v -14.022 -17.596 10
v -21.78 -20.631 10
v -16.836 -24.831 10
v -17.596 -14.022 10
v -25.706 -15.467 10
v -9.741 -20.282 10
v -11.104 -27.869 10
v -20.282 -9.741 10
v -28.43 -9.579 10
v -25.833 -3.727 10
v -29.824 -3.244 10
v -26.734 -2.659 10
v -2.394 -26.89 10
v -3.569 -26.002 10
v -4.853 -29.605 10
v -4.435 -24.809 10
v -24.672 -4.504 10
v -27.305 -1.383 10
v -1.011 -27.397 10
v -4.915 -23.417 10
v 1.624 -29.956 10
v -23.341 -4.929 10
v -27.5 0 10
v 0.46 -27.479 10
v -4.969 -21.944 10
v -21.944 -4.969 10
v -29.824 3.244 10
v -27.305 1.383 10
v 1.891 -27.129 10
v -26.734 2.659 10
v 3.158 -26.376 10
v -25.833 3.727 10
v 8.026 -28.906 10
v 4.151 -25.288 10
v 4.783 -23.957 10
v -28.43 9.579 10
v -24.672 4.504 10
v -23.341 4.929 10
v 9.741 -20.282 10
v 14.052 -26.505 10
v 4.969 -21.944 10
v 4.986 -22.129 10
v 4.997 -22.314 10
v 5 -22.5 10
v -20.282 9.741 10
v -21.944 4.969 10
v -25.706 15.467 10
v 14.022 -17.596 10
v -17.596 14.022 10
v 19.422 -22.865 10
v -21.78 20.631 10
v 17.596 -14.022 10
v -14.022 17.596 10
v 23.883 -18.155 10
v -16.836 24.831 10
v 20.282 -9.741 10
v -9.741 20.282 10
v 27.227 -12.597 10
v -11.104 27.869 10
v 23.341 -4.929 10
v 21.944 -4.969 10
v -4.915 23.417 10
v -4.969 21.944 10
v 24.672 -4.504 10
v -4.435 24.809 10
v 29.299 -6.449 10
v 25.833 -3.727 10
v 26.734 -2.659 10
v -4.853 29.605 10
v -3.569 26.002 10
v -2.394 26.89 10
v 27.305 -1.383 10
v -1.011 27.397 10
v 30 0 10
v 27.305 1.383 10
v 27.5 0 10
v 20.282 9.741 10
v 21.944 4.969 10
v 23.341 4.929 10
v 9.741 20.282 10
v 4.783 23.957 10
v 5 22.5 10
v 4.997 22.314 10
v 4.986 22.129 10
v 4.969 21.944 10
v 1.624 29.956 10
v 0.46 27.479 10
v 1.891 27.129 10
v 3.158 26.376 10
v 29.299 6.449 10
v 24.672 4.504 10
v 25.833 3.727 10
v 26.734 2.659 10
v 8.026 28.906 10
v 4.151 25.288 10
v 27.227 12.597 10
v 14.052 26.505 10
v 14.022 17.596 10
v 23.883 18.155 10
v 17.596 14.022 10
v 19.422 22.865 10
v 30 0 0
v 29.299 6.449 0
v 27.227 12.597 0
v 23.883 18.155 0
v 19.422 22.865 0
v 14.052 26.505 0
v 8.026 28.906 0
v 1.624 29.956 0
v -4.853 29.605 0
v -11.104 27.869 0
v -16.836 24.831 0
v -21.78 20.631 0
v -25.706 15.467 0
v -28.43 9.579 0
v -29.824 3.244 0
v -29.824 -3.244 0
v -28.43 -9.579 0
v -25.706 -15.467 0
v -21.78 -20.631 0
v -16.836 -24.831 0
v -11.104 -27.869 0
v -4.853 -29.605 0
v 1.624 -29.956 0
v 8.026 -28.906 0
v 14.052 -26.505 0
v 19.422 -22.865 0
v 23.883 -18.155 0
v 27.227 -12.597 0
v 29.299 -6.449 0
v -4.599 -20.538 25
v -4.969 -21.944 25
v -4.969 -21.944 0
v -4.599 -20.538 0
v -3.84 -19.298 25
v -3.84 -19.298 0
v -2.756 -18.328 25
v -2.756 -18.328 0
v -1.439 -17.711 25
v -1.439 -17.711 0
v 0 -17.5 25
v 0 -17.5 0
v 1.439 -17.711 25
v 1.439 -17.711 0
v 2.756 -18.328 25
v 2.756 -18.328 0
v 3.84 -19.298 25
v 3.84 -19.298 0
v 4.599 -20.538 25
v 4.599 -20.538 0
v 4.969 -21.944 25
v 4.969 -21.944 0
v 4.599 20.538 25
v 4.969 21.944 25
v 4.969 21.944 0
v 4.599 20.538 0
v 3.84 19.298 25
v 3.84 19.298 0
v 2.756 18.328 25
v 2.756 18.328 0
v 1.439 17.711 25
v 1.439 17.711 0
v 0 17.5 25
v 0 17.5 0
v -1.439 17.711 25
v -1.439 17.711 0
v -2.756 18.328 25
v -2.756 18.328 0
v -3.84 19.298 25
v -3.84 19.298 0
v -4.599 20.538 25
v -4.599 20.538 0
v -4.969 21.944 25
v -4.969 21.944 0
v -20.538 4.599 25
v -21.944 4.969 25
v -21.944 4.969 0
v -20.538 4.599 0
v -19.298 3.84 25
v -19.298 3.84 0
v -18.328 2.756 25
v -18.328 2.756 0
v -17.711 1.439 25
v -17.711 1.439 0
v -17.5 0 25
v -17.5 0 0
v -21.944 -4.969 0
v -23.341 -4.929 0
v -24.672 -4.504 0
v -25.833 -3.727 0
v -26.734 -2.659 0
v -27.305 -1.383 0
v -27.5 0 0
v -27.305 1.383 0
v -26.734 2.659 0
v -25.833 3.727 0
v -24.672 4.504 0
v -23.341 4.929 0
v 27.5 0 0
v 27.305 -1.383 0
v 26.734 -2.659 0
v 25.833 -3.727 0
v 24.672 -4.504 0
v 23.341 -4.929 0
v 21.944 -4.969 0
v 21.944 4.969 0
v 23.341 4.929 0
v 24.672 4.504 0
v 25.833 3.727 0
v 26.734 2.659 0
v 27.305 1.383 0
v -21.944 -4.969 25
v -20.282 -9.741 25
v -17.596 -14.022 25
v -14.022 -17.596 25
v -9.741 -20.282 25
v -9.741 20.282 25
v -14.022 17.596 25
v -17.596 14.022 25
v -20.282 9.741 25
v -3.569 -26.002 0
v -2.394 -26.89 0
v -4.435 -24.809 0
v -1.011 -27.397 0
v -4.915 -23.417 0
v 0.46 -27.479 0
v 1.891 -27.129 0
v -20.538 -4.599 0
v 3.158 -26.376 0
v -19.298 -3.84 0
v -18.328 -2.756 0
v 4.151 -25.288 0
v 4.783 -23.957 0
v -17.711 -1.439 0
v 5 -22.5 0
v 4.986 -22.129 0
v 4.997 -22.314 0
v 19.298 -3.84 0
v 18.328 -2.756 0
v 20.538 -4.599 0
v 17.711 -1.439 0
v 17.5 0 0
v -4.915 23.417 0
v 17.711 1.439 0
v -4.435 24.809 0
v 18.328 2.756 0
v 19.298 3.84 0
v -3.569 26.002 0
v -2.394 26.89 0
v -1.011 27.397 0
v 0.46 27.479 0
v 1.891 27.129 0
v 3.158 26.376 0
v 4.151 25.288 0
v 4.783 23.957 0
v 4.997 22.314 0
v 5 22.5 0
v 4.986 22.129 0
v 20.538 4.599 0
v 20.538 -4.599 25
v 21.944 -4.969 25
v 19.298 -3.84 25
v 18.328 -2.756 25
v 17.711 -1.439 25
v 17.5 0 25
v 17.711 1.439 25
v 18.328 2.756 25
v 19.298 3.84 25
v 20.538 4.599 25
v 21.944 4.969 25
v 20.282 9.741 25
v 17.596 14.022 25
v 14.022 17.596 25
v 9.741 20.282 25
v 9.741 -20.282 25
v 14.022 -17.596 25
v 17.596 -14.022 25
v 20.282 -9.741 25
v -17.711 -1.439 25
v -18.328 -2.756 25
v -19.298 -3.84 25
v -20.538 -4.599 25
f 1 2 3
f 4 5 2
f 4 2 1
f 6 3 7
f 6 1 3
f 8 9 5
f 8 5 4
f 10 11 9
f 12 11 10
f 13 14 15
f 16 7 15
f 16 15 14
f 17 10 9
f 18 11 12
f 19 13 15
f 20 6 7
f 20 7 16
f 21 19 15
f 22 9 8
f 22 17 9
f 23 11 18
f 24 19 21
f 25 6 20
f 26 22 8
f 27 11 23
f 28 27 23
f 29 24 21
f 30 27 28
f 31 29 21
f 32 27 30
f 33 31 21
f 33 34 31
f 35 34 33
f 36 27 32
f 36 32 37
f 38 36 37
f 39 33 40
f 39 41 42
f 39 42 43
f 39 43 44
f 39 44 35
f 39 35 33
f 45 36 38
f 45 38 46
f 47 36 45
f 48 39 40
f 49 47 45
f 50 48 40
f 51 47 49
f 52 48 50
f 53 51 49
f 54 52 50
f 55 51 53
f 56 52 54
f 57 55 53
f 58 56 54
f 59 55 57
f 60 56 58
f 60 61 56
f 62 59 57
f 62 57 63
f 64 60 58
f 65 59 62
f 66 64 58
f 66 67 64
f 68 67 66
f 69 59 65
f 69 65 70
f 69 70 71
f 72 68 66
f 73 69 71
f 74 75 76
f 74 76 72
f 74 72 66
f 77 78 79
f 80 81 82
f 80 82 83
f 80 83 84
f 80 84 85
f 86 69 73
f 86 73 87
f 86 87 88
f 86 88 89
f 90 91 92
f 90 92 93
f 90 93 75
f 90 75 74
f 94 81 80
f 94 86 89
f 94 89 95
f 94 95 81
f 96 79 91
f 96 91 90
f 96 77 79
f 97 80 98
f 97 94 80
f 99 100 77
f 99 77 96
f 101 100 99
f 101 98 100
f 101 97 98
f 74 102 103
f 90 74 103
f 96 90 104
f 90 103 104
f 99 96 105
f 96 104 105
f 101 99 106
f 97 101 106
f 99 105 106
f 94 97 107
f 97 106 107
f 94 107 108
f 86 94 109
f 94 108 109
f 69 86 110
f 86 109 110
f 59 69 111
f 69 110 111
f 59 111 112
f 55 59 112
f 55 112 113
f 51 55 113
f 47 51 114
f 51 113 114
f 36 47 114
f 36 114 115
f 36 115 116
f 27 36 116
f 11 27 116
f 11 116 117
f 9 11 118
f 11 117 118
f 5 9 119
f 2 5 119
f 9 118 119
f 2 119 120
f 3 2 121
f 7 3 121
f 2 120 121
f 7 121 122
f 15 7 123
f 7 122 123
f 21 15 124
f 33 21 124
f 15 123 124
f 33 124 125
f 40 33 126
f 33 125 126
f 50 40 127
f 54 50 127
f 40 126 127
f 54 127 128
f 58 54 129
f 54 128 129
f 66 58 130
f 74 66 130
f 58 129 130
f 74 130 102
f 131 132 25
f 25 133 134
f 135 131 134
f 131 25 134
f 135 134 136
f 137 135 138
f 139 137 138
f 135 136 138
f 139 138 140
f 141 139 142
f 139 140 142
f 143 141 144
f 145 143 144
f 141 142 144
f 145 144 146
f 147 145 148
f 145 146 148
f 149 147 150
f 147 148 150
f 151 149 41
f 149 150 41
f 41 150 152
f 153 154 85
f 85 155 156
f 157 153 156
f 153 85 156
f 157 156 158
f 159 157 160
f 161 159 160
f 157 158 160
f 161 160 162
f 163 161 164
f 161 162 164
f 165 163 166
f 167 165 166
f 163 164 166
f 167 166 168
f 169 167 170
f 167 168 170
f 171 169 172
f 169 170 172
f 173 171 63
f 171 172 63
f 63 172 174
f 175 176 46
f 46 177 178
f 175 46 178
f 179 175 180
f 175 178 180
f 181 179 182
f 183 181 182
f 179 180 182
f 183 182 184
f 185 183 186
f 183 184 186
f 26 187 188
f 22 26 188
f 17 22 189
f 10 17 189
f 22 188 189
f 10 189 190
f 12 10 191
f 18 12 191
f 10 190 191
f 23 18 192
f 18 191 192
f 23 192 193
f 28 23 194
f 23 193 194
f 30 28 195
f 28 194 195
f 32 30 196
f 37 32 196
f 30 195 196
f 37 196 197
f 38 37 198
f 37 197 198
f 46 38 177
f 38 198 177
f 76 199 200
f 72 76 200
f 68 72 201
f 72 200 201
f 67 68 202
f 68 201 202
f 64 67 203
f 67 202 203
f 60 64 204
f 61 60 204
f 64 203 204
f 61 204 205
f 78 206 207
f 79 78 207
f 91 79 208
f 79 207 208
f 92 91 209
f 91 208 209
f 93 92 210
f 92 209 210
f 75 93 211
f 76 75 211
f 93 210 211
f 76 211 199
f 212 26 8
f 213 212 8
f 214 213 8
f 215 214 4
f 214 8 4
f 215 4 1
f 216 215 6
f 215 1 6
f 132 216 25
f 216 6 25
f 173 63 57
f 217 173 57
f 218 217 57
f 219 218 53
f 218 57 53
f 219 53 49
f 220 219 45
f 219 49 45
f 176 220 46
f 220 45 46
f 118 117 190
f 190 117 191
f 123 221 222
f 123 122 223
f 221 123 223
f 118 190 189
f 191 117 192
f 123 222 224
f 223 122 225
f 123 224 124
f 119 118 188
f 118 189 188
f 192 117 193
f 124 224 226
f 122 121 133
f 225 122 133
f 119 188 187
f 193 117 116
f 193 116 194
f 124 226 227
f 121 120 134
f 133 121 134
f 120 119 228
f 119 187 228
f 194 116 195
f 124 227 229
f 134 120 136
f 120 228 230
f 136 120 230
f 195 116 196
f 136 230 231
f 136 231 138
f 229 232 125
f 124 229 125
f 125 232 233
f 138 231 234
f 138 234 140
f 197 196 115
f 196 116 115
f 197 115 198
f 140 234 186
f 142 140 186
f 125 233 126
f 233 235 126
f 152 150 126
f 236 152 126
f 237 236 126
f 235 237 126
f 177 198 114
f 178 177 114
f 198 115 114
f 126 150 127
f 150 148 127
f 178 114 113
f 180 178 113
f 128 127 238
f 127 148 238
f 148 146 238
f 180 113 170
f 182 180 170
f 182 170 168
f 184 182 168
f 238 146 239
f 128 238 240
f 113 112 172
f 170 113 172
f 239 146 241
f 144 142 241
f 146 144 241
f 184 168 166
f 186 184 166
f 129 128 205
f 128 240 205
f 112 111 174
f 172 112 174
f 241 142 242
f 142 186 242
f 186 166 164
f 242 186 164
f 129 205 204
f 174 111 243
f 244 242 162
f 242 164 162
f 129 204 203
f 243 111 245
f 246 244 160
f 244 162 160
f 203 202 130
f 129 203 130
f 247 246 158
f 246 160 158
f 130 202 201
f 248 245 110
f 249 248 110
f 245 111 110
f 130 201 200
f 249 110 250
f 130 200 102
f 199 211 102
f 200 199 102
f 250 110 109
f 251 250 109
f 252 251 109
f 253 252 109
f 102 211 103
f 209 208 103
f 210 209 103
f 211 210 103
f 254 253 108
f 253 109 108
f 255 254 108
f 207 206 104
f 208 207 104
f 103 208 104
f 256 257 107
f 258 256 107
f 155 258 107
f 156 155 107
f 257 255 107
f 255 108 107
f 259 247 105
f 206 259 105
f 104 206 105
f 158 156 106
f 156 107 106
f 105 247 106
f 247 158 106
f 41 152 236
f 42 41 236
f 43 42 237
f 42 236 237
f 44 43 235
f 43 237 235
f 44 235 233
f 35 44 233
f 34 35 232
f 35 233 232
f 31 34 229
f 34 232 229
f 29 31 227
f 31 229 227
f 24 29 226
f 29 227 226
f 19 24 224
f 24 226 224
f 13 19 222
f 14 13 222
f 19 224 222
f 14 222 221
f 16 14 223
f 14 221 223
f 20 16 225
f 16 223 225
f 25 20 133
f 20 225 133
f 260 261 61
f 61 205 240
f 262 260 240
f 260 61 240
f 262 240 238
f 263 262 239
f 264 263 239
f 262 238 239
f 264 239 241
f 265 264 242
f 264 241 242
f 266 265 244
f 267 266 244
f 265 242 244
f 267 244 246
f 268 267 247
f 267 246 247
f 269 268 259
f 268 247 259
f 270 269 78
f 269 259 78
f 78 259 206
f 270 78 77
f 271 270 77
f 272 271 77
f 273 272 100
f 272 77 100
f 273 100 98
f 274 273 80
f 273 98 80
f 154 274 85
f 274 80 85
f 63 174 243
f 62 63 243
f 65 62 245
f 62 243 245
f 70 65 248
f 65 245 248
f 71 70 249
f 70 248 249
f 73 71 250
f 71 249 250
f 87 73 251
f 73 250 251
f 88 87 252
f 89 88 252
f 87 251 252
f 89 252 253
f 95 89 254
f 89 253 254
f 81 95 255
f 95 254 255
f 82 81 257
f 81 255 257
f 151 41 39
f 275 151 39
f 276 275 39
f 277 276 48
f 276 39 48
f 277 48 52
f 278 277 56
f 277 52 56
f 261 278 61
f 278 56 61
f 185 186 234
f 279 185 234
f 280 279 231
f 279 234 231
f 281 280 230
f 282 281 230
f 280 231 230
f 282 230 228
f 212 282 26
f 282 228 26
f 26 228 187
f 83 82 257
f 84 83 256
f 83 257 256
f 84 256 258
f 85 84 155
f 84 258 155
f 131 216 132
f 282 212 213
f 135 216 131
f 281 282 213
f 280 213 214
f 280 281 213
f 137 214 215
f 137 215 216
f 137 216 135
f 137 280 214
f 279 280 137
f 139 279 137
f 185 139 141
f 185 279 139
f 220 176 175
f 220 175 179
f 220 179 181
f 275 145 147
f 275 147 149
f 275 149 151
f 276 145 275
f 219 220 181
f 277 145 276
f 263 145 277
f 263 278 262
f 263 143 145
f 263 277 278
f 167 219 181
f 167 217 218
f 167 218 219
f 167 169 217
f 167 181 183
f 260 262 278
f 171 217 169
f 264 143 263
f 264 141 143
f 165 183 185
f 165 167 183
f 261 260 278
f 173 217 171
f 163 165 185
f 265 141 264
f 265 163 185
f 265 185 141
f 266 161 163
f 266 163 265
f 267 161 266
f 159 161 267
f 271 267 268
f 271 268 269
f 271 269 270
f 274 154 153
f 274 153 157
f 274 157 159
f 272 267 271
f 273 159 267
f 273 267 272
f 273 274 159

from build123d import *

# Parameters (mm, degrees)
F1_DEPTH = 25
F0_R     = 30
F2_DEPTH = 10


with BuildPart() as f1:
    # F0 (on Top) → F1 (new body)
    with BuildSketch(Plane.XY):
        with BuildLine():
            ThreePointArc((21.9444444444, -4.96903995), (17.5, 0), (21.9444444444, 4.96903995))
            ThreePointArc((21.9444444444, 4.96903995), (15.9099025767, 15.9099025767), (4.96903995, 21.9444444444))
            ThreePointArc((4.96903995, 21.9444444444), (0, 17.5), (-4.96903995, 21.9444444444))
            ThreePointArc((-4.96903995, 21.9444444444), (-15.9099025767, 15.9099025767), (-21.9444444444, 4.96903995))
            ThreePointArc((-21.9444444444, 4.96903995), (-18.7732200375, 3.3333333333), (-17.5, 0))
            ThreePointArc((-17.5, 0), (-18.7732200375, -3.3333333333), (-21.9444444444, -4.96903995))
            ThreePointArc((-21.9444444444, -4.96903995), (-15.9099025767, -15.9099025767), (-4.96903995, -21.9444444444))
            ThreePointArc((-4.96903995, -21.9444444444), (0, -17.5), (4.96903995, -21.9444444444))
            ThreePointArc((4.96903995, -21.9444444444), (15.9099025767, -15.9099025767), (21.9444444444, -4.96903995))
        make_face()
    extrude(amount=F1_DEPTH)

    # F0 (on Top) → F2 (join)
    with BuildSketch(Plane.XY):
        Circle(F0_R)
        with BuildLine():
            ThreePointArc((4.96903995, 21.9444444444), (15.9099025767, 15.9099025767), (21.9444444444, 4.96903995))
            ThreePointArc((21.9444444444, 4.96903995), (25.8333333333, 3.7267799625), (27.5, 0))
            ThreePointArc((27.5, 0), (25.8333333333, -3.7267799625), (21.9444444444, -4.96903995))
            ThreePointArc((21.9444444444, -4.96903995), (15.9099025767, -15.9099025767), (4.96903995, -21.9444444444))
            ThreePointArc((4.96903995, -21.9444444444), (4.9922539874, -22.2217912205), (5, -22.5))
            ThreePointArc((5, -22.5), (-0.2782087795, -27.4922539874), (-4.96903995, -21.9444444444))
            ThreePointArc((-4.96903995, -21.9444444444), (-15.9099025767, -15.9099025767), (-21.9444444444, -4.96903995))
            ThreePointArc((-21.9444444444, -4.96903995), (-27.5, 0), (-21.9444444444, 4.96903995))
            ThreePointArc((-21.9444444444, 4.96903995), (-15.9099025767, 15.9099025767), (-4.96903995, 21.9444444444))
            ThreePointArc((-4.96903995, 21.9444444444), (-0.2782087795, 27.4922539874), (5, 22.5))
            ThreePointArc((5, 22.5), (4.9922539874, 22.2217912205), (4.96903995, 21.9444444444))
        make_face(mode=Mode.SUBTRACT)
    extrude(amount=F2_DEPTH)


solid = f1.part
